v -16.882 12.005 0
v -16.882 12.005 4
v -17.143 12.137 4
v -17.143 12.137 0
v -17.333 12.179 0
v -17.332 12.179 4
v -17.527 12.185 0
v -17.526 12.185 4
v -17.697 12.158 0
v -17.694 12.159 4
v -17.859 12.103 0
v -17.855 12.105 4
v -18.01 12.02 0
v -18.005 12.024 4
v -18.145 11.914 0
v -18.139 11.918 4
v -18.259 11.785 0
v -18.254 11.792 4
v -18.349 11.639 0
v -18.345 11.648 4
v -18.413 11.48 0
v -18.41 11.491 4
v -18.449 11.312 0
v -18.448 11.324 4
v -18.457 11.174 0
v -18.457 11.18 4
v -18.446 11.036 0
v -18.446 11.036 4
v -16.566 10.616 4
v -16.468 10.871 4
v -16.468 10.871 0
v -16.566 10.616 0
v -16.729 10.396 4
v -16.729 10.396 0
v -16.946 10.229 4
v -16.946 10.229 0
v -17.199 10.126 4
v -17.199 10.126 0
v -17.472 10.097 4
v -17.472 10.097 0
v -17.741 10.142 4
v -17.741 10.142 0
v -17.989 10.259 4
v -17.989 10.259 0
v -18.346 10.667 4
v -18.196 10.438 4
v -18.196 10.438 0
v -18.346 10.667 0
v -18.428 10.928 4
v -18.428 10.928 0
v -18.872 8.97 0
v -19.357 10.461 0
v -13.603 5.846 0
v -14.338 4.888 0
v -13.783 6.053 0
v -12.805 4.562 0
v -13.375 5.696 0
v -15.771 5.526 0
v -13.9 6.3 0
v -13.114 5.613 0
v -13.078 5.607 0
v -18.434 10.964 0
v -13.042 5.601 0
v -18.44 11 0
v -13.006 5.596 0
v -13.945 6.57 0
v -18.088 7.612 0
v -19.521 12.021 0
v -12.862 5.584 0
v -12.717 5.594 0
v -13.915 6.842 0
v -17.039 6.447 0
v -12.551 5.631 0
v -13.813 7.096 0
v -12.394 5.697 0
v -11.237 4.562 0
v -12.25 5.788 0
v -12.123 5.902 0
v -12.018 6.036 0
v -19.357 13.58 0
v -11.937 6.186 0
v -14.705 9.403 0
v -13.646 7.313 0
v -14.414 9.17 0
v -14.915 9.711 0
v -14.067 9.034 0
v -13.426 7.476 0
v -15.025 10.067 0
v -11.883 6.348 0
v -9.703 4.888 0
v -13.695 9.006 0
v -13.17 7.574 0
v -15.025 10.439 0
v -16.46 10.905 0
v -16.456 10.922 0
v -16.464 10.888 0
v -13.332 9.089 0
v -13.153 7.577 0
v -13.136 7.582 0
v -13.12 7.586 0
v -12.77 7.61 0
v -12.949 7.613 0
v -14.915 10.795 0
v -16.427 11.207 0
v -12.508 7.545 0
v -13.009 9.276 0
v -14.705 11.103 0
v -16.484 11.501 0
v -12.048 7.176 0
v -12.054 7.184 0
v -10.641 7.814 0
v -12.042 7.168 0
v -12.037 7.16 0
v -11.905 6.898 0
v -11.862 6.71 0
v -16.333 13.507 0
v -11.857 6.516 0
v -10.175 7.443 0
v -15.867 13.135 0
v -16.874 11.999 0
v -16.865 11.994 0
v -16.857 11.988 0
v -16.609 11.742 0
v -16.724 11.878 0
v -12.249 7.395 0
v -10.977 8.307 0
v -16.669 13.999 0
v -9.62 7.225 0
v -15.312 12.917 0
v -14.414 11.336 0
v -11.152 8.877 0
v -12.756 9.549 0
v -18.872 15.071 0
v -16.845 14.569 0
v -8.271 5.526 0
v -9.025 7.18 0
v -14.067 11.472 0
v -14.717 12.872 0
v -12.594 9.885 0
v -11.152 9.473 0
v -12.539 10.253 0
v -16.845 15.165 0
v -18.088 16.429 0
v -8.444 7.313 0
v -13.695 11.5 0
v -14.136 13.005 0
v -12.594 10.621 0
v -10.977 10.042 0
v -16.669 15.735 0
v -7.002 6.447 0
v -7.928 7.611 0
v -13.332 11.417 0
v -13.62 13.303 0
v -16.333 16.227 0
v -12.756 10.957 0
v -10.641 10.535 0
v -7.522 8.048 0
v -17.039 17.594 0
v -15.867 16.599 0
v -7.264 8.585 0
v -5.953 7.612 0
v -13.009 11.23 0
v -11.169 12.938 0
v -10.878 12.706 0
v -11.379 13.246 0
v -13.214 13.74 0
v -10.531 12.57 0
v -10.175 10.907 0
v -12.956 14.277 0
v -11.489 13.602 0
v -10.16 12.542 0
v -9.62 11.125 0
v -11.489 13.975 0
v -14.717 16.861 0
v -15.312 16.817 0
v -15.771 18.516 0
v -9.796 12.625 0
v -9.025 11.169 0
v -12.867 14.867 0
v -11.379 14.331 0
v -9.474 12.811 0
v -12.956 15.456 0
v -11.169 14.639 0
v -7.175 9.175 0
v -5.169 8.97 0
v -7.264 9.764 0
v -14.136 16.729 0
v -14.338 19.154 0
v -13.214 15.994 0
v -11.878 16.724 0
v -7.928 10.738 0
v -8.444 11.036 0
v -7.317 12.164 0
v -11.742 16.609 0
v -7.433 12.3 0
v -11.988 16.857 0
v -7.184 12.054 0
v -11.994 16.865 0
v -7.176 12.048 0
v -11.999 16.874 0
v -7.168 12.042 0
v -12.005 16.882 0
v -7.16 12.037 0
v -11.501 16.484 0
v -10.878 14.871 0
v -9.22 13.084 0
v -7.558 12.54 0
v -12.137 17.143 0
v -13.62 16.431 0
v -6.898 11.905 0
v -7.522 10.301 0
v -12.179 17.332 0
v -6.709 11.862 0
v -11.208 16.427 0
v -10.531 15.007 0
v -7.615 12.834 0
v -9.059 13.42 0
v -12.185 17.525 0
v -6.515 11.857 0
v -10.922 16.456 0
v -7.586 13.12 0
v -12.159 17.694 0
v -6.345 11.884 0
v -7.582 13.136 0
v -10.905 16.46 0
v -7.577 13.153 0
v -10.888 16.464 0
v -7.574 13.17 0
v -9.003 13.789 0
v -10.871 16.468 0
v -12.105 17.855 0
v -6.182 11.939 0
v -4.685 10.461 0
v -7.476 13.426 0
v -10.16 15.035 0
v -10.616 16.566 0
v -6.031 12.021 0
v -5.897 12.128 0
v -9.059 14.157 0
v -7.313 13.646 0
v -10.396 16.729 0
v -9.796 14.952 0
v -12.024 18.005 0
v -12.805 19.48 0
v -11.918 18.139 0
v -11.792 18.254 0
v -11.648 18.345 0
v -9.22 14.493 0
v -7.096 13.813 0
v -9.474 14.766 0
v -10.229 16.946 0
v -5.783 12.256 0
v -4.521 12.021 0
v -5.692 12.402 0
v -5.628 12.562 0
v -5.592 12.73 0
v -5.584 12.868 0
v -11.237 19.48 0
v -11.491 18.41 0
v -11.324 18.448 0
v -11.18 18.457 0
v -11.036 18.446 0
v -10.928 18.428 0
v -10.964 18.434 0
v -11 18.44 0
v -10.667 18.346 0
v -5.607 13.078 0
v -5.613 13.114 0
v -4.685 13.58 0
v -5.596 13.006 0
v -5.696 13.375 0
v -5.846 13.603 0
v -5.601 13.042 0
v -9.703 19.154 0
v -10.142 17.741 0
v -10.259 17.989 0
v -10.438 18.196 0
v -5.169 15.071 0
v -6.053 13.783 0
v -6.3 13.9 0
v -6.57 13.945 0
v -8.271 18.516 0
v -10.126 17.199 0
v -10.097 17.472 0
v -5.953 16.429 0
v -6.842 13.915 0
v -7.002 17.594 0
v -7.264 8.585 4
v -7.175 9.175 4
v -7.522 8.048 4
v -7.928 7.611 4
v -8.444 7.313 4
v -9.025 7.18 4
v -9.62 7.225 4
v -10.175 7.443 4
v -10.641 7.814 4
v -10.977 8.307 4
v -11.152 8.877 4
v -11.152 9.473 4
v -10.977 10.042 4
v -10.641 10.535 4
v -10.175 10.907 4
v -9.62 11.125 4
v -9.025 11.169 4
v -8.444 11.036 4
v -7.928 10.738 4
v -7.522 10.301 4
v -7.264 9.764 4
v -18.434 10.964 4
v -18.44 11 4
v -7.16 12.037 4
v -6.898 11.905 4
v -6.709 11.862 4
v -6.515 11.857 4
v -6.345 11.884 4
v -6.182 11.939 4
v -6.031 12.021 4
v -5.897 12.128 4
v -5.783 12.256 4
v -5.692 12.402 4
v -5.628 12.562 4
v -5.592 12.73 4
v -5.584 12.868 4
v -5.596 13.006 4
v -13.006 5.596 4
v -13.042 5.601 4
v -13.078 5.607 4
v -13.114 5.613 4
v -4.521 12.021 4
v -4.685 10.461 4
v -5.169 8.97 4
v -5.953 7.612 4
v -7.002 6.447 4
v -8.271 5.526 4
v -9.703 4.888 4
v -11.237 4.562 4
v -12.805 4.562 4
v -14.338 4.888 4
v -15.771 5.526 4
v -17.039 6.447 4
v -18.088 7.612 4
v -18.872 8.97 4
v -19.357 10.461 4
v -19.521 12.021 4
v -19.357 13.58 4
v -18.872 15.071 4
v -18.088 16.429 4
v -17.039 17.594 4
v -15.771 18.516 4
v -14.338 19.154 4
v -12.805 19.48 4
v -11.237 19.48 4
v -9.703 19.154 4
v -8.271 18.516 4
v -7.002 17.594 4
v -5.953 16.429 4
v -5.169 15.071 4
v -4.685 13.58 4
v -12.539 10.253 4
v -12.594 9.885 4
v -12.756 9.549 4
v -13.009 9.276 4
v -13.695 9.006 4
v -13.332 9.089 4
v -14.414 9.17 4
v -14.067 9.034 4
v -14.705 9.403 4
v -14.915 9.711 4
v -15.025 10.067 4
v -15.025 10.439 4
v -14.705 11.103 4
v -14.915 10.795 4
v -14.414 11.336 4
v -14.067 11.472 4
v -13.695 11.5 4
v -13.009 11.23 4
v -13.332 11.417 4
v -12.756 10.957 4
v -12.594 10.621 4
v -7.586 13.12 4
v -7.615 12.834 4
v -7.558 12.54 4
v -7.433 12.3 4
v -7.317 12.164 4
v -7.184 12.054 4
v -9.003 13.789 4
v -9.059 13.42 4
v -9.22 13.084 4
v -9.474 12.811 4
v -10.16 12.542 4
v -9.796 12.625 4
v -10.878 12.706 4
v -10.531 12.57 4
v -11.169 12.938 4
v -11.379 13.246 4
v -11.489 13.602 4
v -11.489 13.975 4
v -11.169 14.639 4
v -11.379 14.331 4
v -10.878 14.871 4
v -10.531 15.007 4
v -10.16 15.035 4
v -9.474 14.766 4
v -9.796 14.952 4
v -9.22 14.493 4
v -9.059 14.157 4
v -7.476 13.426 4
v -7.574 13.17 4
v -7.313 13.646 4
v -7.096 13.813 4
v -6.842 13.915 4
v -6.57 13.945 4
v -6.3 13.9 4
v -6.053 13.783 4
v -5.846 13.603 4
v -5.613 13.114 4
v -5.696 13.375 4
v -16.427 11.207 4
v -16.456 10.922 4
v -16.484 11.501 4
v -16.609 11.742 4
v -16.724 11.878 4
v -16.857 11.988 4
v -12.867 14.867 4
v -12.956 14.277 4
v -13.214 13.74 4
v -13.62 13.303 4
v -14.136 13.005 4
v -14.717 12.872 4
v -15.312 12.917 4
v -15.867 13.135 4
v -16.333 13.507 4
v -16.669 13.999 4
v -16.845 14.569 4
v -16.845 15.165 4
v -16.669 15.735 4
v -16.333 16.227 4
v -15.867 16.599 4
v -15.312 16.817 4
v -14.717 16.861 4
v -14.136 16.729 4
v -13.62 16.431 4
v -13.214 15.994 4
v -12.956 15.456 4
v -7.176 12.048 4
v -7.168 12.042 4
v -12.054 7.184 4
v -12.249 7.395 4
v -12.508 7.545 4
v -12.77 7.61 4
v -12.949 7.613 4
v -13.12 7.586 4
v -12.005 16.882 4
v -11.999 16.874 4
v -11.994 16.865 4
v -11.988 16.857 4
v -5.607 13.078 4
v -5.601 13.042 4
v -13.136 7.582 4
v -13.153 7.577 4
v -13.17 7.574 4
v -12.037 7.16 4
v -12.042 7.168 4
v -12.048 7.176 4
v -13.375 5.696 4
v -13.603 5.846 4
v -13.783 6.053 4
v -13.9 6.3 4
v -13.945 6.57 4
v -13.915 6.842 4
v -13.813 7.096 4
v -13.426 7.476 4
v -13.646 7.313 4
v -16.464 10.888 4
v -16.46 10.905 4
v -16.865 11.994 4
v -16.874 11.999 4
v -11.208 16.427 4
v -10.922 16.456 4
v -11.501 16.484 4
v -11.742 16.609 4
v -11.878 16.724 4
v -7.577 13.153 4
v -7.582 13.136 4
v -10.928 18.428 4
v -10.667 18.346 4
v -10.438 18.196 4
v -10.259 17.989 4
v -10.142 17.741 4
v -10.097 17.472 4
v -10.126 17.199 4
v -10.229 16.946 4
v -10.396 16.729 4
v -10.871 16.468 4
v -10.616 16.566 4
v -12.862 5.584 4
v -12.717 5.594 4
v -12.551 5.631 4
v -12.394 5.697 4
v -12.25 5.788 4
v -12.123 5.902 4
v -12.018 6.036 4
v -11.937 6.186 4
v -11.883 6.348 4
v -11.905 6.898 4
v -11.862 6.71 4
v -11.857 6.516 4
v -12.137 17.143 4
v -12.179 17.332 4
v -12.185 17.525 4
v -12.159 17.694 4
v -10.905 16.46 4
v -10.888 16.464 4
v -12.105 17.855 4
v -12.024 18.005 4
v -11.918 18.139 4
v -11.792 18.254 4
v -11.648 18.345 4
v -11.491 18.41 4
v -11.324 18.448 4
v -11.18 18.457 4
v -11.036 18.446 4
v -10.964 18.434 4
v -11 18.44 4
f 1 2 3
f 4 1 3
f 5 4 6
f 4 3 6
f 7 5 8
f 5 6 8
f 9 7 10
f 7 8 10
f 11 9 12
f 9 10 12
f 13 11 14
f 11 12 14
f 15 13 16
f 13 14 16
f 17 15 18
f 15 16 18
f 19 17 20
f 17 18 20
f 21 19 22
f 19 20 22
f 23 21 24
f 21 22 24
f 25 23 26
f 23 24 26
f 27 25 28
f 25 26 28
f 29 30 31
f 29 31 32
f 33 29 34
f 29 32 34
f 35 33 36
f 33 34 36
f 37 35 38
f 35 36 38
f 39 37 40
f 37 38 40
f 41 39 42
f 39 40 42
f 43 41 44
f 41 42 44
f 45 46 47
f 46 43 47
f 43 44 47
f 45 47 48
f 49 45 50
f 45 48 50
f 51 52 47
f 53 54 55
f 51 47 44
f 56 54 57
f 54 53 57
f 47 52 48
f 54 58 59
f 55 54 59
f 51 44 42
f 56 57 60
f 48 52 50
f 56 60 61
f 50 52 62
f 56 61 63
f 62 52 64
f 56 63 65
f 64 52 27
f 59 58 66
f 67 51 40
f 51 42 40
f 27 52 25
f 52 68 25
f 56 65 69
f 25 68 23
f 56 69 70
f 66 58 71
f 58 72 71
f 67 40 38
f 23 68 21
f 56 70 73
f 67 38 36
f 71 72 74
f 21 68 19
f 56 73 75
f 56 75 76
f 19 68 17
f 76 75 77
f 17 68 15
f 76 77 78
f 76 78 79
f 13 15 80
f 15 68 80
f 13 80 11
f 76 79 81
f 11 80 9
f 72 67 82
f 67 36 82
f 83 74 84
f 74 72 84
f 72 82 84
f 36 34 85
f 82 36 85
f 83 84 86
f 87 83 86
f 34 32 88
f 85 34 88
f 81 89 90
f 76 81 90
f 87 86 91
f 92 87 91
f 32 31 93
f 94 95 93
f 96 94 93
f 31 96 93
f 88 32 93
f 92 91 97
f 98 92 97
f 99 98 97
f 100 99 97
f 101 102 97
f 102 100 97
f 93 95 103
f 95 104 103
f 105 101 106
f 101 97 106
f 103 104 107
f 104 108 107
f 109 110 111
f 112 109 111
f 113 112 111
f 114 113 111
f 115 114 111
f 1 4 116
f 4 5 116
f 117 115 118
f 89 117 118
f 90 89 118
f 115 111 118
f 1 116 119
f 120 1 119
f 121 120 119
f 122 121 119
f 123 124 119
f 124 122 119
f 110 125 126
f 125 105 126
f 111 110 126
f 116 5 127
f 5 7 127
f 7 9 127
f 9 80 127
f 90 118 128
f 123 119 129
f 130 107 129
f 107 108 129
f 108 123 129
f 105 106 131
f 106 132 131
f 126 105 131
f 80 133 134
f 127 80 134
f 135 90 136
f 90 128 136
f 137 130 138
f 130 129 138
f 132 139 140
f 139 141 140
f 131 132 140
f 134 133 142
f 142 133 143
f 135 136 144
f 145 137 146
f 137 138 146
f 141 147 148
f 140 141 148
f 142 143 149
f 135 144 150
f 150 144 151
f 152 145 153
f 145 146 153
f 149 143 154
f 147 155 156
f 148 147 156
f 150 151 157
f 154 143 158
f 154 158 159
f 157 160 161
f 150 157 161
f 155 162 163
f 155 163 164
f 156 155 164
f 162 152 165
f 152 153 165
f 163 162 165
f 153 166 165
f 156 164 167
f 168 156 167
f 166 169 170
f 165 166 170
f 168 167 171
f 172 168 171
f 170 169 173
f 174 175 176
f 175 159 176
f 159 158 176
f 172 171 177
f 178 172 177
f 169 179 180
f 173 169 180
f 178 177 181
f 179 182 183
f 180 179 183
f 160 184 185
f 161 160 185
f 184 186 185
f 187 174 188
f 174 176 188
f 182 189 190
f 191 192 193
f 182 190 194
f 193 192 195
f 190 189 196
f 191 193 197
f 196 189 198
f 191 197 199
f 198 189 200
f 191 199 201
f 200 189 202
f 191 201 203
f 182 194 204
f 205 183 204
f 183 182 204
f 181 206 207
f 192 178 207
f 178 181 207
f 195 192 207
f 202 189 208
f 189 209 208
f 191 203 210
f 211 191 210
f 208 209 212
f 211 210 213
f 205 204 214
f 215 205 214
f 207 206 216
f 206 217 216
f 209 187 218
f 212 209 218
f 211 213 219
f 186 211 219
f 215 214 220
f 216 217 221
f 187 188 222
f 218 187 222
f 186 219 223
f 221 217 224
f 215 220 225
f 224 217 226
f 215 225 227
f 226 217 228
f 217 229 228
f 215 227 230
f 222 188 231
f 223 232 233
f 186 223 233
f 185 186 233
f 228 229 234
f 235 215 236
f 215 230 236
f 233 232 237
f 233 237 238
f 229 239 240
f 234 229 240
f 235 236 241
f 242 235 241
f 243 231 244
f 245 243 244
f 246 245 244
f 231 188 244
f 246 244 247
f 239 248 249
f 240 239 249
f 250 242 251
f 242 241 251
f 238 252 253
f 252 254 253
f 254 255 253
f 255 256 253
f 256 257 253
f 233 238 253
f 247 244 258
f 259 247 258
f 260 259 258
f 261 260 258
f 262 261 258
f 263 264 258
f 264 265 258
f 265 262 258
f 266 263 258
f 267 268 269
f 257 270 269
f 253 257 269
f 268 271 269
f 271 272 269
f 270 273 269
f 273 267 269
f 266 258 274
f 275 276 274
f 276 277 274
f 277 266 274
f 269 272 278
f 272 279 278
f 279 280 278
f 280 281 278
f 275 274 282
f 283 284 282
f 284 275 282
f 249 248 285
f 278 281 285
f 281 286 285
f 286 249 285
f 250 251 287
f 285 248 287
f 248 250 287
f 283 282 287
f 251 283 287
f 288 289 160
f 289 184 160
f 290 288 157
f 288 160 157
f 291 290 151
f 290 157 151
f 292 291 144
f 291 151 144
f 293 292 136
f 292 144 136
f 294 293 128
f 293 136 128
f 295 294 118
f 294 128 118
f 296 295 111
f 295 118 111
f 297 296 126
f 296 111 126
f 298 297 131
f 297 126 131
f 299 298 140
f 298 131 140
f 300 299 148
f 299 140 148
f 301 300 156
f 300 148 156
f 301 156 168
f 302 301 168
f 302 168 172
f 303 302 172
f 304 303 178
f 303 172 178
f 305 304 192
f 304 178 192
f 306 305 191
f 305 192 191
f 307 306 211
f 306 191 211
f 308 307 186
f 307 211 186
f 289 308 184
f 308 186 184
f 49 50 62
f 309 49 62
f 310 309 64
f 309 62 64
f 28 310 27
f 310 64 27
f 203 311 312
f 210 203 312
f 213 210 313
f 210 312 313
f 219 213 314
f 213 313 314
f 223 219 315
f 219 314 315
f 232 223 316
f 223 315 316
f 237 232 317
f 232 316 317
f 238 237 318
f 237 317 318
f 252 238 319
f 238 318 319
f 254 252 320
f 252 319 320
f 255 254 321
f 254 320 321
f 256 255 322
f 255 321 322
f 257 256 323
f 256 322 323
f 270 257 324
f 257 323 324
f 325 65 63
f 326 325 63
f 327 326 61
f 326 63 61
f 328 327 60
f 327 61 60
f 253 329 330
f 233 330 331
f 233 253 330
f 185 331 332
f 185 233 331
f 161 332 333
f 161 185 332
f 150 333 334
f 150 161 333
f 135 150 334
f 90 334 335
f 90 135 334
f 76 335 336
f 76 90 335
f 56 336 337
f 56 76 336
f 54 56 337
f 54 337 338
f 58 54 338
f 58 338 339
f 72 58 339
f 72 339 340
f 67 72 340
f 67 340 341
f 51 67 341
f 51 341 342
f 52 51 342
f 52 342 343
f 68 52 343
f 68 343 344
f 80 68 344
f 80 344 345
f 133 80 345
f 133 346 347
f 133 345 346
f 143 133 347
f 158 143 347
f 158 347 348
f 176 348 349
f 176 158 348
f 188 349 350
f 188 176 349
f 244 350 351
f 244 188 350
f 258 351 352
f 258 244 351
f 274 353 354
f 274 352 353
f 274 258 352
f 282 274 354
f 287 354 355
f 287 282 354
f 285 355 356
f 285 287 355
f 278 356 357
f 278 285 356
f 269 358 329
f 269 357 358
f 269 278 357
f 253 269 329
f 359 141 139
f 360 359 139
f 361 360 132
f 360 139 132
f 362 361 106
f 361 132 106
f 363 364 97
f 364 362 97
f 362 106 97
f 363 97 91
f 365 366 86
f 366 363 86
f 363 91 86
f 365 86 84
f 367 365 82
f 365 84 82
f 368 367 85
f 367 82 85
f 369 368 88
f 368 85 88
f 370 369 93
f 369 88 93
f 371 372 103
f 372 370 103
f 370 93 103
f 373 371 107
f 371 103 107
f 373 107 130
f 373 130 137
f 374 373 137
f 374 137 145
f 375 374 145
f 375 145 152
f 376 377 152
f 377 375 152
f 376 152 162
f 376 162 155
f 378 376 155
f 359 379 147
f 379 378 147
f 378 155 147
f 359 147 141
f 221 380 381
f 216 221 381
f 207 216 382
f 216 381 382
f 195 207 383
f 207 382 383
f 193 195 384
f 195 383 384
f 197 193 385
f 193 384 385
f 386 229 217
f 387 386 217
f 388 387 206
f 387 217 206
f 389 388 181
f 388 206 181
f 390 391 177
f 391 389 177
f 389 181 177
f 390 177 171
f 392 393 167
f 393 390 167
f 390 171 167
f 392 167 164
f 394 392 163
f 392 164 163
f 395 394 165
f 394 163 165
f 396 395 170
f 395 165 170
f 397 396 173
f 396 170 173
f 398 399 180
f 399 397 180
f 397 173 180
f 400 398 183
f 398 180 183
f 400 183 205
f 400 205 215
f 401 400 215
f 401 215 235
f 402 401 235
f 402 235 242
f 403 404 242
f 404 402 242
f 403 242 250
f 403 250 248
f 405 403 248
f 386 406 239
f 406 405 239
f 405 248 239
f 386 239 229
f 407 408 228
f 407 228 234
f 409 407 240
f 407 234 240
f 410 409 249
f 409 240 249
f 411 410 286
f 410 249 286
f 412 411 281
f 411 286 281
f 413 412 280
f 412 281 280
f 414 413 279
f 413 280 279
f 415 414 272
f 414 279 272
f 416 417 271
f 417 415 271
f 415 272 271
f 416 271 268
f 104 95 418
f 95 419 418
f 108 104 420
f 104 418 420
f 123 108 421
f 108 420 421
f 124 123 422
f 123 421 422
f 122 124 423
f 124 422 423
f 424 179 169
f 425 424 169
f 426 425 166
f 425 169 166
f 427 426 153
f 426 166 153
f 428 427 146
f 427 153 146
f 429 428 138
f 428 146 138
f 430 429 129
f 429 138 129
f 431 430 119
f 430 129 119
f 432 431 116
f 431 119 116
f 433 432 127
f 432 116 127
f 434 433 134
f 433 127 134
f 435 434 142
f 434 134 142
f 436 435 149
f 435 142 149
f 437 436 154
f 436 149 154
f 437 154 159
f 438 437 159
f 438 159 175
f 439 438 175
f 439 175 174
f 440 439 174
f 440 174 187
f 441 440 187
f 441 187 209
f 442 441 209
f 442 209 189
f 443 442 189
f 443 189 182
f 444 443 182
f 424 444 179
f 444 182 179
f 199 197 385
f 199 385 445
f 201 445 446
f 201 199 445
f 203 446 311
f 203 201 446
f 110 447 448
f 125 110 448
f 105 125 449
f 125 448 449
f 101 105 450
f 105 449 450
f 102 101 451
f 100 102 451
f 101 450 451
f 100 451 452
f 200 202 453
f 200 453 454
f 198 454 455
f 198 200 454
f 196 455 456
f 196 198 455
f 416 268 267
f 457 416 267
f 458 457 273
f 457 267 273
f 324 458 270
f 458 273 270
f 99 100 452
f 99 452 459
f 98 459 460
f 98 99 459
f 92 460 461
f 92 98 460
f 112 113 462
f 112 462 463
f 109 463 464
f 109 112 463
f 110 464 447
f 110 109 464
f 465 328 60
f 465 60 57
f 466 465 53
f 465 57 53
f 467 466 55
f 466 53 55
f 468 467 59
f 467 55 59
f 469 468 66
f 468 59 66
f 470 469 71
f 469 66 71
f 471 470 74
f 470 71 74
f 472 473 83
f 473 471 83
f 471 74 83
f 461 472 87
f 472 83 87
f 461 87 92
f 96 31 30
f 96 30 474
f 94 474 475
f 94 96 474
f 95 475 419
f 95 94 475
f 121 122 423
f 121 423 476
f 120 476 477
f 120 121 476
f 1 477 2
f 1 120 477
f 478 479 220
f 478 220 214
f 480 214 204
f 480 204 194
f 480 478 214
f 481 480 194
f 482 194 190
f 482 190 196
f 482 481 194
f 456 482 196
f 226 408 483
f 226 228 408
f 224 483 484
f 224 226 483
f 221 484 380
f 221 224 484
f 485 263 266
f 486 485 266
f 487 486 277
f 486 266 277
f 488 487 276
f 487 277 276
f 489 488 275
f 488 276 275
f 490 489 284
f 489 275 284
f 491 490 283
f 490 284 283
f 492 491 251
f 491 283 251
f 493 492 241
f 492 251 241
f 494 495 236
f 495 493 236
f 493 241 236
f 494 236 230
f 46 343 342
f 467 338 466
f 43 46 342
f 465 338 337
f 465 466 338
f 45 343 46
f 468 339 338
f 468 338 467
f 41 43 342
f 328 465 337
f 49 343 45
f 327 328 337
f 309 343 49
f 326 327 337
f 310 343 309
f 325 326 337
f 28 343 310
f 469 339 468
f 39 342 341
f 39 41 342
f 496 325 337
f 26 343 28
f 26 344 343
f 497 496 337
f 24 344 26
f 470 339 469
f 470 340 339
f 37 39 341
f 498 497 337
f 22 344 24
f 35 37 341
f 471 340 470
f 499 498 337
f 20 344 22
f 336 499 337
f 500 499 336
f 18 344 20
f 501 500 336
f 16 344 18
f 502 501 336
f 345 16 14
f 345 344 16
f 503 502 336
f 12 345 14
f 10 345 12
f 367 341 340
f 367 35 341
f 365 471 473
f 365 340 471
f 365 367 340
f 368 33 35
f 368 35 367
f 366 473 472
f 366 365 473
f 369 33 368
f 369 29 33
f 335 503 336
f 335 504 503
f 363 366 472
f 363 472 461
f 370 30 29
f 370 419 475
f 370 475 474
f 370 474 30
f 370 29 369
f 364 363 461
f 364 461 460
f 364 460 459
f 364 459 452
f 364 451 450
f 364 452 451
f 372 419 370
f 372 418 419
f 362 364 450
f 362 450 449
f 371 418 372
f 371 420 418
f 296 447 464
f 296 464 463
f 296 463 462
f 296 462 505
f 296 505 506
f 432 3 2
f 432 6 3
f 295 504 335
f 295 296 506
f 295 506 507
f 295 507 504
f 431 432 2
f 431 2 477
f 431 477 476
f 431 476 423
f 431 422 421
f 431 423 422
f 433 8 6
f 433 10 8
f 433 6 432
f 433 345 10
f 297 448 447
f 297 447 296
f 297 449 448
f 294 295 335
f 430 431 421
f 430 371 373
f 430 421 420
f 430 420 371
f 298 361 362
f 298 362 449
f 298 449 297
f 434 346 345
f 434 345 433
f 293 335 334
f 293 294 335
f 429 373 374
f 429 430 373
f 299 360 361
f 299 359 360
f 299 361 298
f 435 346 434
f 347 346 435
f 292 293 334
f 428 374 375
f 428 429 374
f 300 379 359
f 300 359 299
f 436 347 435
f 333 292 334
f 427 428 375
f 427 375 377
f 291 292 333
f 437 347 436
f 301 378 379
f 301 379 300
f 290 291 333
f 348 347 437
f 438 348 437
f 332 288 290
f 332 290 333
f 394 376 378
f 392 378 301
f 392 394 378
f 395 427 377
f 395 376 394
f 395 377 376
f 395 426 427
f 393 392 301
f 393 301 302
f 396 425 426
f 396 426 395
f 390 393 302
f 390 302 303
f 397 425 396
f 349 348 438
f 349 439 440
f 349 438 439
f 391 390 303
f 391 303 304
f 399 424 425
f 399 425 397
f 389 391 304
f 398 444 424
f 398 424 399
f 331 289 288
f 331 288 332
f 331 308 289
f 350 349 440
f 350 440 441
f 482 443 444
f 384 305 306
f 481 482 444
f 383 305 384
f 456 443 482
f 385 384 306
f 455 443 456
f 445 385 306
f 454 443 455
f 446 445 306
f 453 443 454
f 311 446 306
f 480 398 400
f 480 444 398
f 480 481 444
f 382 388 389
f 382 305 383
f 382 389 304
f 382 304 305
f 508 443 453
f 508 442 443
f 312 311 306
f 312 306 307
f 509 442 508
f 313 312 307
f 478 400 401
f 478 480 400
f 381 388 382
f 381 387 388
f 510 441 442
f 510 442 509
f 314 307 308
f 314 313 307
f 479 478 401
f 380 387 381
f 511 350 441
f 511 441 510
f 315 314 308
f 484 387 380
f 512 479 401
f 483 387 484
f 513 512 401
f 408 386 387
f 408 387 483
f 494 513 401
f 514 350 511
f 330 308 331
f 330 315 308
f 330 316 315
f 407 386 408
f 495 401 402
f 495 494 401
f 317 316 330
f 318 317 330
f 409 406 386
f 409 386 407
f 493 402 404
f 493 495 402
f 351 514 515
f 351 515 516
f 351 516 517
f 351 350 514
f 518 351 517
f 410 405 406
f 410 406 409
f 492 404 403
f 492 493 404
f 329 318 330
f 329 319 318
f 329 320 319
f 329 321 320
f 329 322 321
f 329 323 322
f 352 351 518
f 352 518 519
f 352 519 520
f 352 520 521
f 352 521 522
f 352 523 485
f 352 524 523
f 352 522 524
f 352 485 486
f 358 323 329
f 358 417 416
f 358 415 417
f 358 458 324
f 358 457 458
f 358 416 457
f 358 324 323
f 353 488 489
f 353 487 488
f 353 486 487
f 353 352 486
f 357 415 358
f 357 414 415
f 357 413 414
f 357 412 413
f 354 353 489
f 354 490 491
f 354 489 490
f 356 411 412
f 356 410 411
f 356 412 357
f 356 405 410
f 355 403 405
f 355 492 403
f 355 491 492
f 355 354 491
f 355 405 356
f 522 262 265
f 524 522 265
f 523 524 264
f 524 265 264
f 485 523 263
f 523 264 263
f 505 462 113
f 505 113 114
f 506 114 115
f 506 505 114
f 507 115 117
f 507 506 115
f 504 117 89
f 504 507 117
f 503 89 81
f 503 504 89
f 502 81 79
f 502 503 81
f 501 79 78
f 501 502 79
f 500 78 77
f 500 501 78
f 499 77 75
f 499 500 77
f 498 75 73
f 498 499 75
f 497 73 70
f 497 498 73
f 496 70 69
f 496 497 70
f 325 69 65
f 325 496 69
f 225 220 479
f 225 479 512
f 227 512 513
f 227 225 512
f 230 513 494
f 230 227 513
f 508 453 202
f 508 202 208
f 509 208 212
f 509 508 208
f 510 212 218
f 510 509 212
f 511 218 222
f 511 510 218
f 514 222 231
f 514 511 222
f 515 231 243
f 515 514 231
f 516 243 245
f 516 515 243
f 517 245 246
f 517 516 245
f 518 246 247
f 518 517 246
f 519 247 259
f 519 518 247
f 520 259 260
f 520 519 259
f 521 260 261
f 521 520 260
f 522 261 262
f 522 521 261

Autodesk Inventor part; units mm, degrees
ref_plane "YZ Plane" through (0, 0, 0) normal (1, 0, 0) x (0, 1, 0)
ref_plane "XZ Plane" through (0, 0, 0) normal (0, 1, 0) x (-1, 0, 0)
ref_plane "XY Plane" through (0, 0, 0) normal (0, 0, 1) x (1, 0, 0)
sketch "スケッチ1" plane through (0, 0, 0) normal (0, 0, 1) x (1, 0, 0)
  circle A0 centre (-12.0208, 12.0208) radius 9.5
  arc A1 (-18.7383, 18.7383) -> (-18.7383, -18.7383) centre (0, 0) ccw
  circle A2 centre (-14.8669, 14.8669) radius 2
  circle A3 centre (-10.253, 13.7886) radius 1.25
  circle A4 centre (-13.7886, 10.253) radius 1.25
  circle A5 centre (-9.1747, 9.1747) radius 2
  circle A6 centre (-12.0208, -12.0208) radius 9.5
  arc A7 (-8.2499, -13.092) -> (-13.092, -8.2499) centre (-9.1747, -9.1747) ccw
  circle A8 centre (-9.1747, -9.1747) radius 2
  circle A9 centre (-13.7886, -10.253) radius 1.25
  arc A10 (-13.9423, -9.0125) -> (-13.092, -8.2499) centre (-14.0653, -8.0201) ccw
  arc A11 (-15.7917, -10.9496) -> (-15.0291, -10.0993) centre (-16.0215, -9.9764) ccw
  arc A12 (-15.7917, -10.9496) -> (-10.9496, -15.7917) centre (-14.8669, -14.8669) ccw
  circle A13 centre (-14.8669, -14.8669) radius 2
  circle A14 centre (-10.253, -13.7886) radius 1.25
  arc A15 (-10.0993, -15.0291) -> (-10.9496, -15.7917) centre (-9.9764, -16.0215) ccw
  arc A16 (-10.0993, -15.0291) -> (-9.0125, -13.9423) centre (-10.253, -13.7886) ccw
  arc A17 (-8.2499, -13.092) -> (-9.0125, -13.9423) centre (-8.0201, -14.0653) ccw
  arc A18 (-7.6297, -14.4272) -> (-14.4272, -7.6297) centre (-9.1747, -9.1747) ccw
  arc A19 (-9.6145, -16.412) -> (-7.6297, -14.4272) centre (-10.253, -13.7886) ccw
  arc A20 (-16.412, -9.6145) -> (-9.6145, -16.412) centre (-14.8669, -14.8669) ccw
  arc A21 (-14.4272, -7.6297) -> (-16.412, -9.6145) centre (-13.7886, -10.253) ccw
  arc A22 (-11.6204, 16.1746) -> (-16.1746, 11.6204) centre (-14.8669, 14.8669) ccw
  arc A23 (-7.8671, 12.4213) -> (-11.6204, 16.1746) centre (-10.253, 13.7886) ccw
  arc A24 (-16.1746, 11.6204) -> (-12.4213, 7.8671) centre (-13.7886, 10.253) ccw
  arc A25 (-12.4213, 7.8671) -> (-7.8671, 12.4213) centre (-9.1747, 9.1747) ccw
  circle A26 centre (-12.0208, -12.0208) radius 8
  line L0 (-25.4165, 7.5) -> (-25.4165, -7.5)
  line L1 (-23.9165, 7.2801) -> (-23.9165, -7.2801)
  arc A27 (-21.491, 12.7724) -> (-23.9165, 7.2801) centre (0, 0) ccw
  arc A28 (-23.9165, -7.2801) -> (-21.491, -12.7724) centre (0, 0) ccw
  line L2 (-2.5208, 12.0208) -> (-2.5208, -12.0208)
  line L3 (-4.0208, 6.8973) -> (-4.0208, -6.8973)
  circle A29 centre (-12.0208, 12.0208) radius 7.5
  line L4 (-13.7886, -10.253) -> (-4.0461, -19.9955) construction
  line L5 (-13.7886, 10.253) -> (-4.0869, 19.9547) construction
  line L6 (-12.7708, 2.5505) -> (-12.7708, -2.5505)
  line L7 (-11.2708, 2.5505) -> (-11.2708, -2.5505)
  arc A30 (-10.8714, 16.4682) -> (-10.9282, 18.4283) centre (-11.0963, 17.4426) ccw
  arc A31 (-5.6133, 13.1135) -> (-7.5735, 13.1702) centre (-6.5991, 12.9454) ccw
  arc A32 (-13.1702, 7.5735) -> (-13.1135, 5.6133) centre (-12.9454, 6.5991) ccw
  arc A33 (-18.4283, 10.9282) -> (-16.4682, 10.8714) centre (-17.4426, 11.0963) ccw
  arc A34 (-10.9282, 18.4283) -> (-13.9213, 18.2368) centre (-12.0208, 12.0208) ccw
  arc A35 (-18.2368, 13.9213) -> (-18.4283, 10.9282) centre (-12.0208, 12.0208) ccw
  arc A36 (-13.1135, 5.6133) -> (-10.1203, 5.8049) centre (-12.0208, 12.0208) ccw
  arc A37 (-5.8049, 10.1203) -> (-5.6133, 13.1135) centre (-12.0208, 12.0208) ccw
  point P0 (0, 0)
  point P1 (0, 0)
  point P2 (-5.3033, -18.7383)
  point P3 (-5.3033, 18.7383)
  dimension "d0" = 1.45
  dimension "d1" = 1.45
  dimension "d2" = 1.5
  dimension "d3" = 1.5
  dimension "d4" = 1.5
  dimension "d5" = 1.5
  dimension "d6" = 1.5
  dimension "d7" = 15
  dimension "d8" = 1.5
  dimension "d9" = 1.5
  dimension "d10" = 1.5
  dimension "d11" = 1.5
  dimension "d12" = 15
  dimension "d13" = 1.5
  dimension "d14" = 0.75
  dimension "d16" = 2
  dimension "d17" = 2
  dimension "d18" = 2
  dimension "d19" = 2
  dimension "d23" = 4
  dimension "d24" = 4
  dimension "d25" = 1
  dimension "d26" = 1
  dimension "d27" = 1
  dimension "d28" = 1
extrude "押し出し1" add sketch "スケッチ1" along normal blind 4 contours A23 A25 A29 A24 A22 | A22 A29 A25 A37 A31 A23 A30 A34 | A22 A35 A33 A24 A32 A36 A25 A29
fillet "フィレット1" radius 1 8 edges at (-10.1203, 5.8049, 2) (-12.4213, 7.8671, 2) (-16.1746, 11.6204, 2) (-18.2368, 13.9213, 2) (-7.8671, 12.4213, 2) (-5.8049, 10.1203, 2) (-13.9213, 18.2368, 2) (-11.6204, 16.1746, 2)
properties part number "新型３脚カム" material "アルミニウム 7075"
